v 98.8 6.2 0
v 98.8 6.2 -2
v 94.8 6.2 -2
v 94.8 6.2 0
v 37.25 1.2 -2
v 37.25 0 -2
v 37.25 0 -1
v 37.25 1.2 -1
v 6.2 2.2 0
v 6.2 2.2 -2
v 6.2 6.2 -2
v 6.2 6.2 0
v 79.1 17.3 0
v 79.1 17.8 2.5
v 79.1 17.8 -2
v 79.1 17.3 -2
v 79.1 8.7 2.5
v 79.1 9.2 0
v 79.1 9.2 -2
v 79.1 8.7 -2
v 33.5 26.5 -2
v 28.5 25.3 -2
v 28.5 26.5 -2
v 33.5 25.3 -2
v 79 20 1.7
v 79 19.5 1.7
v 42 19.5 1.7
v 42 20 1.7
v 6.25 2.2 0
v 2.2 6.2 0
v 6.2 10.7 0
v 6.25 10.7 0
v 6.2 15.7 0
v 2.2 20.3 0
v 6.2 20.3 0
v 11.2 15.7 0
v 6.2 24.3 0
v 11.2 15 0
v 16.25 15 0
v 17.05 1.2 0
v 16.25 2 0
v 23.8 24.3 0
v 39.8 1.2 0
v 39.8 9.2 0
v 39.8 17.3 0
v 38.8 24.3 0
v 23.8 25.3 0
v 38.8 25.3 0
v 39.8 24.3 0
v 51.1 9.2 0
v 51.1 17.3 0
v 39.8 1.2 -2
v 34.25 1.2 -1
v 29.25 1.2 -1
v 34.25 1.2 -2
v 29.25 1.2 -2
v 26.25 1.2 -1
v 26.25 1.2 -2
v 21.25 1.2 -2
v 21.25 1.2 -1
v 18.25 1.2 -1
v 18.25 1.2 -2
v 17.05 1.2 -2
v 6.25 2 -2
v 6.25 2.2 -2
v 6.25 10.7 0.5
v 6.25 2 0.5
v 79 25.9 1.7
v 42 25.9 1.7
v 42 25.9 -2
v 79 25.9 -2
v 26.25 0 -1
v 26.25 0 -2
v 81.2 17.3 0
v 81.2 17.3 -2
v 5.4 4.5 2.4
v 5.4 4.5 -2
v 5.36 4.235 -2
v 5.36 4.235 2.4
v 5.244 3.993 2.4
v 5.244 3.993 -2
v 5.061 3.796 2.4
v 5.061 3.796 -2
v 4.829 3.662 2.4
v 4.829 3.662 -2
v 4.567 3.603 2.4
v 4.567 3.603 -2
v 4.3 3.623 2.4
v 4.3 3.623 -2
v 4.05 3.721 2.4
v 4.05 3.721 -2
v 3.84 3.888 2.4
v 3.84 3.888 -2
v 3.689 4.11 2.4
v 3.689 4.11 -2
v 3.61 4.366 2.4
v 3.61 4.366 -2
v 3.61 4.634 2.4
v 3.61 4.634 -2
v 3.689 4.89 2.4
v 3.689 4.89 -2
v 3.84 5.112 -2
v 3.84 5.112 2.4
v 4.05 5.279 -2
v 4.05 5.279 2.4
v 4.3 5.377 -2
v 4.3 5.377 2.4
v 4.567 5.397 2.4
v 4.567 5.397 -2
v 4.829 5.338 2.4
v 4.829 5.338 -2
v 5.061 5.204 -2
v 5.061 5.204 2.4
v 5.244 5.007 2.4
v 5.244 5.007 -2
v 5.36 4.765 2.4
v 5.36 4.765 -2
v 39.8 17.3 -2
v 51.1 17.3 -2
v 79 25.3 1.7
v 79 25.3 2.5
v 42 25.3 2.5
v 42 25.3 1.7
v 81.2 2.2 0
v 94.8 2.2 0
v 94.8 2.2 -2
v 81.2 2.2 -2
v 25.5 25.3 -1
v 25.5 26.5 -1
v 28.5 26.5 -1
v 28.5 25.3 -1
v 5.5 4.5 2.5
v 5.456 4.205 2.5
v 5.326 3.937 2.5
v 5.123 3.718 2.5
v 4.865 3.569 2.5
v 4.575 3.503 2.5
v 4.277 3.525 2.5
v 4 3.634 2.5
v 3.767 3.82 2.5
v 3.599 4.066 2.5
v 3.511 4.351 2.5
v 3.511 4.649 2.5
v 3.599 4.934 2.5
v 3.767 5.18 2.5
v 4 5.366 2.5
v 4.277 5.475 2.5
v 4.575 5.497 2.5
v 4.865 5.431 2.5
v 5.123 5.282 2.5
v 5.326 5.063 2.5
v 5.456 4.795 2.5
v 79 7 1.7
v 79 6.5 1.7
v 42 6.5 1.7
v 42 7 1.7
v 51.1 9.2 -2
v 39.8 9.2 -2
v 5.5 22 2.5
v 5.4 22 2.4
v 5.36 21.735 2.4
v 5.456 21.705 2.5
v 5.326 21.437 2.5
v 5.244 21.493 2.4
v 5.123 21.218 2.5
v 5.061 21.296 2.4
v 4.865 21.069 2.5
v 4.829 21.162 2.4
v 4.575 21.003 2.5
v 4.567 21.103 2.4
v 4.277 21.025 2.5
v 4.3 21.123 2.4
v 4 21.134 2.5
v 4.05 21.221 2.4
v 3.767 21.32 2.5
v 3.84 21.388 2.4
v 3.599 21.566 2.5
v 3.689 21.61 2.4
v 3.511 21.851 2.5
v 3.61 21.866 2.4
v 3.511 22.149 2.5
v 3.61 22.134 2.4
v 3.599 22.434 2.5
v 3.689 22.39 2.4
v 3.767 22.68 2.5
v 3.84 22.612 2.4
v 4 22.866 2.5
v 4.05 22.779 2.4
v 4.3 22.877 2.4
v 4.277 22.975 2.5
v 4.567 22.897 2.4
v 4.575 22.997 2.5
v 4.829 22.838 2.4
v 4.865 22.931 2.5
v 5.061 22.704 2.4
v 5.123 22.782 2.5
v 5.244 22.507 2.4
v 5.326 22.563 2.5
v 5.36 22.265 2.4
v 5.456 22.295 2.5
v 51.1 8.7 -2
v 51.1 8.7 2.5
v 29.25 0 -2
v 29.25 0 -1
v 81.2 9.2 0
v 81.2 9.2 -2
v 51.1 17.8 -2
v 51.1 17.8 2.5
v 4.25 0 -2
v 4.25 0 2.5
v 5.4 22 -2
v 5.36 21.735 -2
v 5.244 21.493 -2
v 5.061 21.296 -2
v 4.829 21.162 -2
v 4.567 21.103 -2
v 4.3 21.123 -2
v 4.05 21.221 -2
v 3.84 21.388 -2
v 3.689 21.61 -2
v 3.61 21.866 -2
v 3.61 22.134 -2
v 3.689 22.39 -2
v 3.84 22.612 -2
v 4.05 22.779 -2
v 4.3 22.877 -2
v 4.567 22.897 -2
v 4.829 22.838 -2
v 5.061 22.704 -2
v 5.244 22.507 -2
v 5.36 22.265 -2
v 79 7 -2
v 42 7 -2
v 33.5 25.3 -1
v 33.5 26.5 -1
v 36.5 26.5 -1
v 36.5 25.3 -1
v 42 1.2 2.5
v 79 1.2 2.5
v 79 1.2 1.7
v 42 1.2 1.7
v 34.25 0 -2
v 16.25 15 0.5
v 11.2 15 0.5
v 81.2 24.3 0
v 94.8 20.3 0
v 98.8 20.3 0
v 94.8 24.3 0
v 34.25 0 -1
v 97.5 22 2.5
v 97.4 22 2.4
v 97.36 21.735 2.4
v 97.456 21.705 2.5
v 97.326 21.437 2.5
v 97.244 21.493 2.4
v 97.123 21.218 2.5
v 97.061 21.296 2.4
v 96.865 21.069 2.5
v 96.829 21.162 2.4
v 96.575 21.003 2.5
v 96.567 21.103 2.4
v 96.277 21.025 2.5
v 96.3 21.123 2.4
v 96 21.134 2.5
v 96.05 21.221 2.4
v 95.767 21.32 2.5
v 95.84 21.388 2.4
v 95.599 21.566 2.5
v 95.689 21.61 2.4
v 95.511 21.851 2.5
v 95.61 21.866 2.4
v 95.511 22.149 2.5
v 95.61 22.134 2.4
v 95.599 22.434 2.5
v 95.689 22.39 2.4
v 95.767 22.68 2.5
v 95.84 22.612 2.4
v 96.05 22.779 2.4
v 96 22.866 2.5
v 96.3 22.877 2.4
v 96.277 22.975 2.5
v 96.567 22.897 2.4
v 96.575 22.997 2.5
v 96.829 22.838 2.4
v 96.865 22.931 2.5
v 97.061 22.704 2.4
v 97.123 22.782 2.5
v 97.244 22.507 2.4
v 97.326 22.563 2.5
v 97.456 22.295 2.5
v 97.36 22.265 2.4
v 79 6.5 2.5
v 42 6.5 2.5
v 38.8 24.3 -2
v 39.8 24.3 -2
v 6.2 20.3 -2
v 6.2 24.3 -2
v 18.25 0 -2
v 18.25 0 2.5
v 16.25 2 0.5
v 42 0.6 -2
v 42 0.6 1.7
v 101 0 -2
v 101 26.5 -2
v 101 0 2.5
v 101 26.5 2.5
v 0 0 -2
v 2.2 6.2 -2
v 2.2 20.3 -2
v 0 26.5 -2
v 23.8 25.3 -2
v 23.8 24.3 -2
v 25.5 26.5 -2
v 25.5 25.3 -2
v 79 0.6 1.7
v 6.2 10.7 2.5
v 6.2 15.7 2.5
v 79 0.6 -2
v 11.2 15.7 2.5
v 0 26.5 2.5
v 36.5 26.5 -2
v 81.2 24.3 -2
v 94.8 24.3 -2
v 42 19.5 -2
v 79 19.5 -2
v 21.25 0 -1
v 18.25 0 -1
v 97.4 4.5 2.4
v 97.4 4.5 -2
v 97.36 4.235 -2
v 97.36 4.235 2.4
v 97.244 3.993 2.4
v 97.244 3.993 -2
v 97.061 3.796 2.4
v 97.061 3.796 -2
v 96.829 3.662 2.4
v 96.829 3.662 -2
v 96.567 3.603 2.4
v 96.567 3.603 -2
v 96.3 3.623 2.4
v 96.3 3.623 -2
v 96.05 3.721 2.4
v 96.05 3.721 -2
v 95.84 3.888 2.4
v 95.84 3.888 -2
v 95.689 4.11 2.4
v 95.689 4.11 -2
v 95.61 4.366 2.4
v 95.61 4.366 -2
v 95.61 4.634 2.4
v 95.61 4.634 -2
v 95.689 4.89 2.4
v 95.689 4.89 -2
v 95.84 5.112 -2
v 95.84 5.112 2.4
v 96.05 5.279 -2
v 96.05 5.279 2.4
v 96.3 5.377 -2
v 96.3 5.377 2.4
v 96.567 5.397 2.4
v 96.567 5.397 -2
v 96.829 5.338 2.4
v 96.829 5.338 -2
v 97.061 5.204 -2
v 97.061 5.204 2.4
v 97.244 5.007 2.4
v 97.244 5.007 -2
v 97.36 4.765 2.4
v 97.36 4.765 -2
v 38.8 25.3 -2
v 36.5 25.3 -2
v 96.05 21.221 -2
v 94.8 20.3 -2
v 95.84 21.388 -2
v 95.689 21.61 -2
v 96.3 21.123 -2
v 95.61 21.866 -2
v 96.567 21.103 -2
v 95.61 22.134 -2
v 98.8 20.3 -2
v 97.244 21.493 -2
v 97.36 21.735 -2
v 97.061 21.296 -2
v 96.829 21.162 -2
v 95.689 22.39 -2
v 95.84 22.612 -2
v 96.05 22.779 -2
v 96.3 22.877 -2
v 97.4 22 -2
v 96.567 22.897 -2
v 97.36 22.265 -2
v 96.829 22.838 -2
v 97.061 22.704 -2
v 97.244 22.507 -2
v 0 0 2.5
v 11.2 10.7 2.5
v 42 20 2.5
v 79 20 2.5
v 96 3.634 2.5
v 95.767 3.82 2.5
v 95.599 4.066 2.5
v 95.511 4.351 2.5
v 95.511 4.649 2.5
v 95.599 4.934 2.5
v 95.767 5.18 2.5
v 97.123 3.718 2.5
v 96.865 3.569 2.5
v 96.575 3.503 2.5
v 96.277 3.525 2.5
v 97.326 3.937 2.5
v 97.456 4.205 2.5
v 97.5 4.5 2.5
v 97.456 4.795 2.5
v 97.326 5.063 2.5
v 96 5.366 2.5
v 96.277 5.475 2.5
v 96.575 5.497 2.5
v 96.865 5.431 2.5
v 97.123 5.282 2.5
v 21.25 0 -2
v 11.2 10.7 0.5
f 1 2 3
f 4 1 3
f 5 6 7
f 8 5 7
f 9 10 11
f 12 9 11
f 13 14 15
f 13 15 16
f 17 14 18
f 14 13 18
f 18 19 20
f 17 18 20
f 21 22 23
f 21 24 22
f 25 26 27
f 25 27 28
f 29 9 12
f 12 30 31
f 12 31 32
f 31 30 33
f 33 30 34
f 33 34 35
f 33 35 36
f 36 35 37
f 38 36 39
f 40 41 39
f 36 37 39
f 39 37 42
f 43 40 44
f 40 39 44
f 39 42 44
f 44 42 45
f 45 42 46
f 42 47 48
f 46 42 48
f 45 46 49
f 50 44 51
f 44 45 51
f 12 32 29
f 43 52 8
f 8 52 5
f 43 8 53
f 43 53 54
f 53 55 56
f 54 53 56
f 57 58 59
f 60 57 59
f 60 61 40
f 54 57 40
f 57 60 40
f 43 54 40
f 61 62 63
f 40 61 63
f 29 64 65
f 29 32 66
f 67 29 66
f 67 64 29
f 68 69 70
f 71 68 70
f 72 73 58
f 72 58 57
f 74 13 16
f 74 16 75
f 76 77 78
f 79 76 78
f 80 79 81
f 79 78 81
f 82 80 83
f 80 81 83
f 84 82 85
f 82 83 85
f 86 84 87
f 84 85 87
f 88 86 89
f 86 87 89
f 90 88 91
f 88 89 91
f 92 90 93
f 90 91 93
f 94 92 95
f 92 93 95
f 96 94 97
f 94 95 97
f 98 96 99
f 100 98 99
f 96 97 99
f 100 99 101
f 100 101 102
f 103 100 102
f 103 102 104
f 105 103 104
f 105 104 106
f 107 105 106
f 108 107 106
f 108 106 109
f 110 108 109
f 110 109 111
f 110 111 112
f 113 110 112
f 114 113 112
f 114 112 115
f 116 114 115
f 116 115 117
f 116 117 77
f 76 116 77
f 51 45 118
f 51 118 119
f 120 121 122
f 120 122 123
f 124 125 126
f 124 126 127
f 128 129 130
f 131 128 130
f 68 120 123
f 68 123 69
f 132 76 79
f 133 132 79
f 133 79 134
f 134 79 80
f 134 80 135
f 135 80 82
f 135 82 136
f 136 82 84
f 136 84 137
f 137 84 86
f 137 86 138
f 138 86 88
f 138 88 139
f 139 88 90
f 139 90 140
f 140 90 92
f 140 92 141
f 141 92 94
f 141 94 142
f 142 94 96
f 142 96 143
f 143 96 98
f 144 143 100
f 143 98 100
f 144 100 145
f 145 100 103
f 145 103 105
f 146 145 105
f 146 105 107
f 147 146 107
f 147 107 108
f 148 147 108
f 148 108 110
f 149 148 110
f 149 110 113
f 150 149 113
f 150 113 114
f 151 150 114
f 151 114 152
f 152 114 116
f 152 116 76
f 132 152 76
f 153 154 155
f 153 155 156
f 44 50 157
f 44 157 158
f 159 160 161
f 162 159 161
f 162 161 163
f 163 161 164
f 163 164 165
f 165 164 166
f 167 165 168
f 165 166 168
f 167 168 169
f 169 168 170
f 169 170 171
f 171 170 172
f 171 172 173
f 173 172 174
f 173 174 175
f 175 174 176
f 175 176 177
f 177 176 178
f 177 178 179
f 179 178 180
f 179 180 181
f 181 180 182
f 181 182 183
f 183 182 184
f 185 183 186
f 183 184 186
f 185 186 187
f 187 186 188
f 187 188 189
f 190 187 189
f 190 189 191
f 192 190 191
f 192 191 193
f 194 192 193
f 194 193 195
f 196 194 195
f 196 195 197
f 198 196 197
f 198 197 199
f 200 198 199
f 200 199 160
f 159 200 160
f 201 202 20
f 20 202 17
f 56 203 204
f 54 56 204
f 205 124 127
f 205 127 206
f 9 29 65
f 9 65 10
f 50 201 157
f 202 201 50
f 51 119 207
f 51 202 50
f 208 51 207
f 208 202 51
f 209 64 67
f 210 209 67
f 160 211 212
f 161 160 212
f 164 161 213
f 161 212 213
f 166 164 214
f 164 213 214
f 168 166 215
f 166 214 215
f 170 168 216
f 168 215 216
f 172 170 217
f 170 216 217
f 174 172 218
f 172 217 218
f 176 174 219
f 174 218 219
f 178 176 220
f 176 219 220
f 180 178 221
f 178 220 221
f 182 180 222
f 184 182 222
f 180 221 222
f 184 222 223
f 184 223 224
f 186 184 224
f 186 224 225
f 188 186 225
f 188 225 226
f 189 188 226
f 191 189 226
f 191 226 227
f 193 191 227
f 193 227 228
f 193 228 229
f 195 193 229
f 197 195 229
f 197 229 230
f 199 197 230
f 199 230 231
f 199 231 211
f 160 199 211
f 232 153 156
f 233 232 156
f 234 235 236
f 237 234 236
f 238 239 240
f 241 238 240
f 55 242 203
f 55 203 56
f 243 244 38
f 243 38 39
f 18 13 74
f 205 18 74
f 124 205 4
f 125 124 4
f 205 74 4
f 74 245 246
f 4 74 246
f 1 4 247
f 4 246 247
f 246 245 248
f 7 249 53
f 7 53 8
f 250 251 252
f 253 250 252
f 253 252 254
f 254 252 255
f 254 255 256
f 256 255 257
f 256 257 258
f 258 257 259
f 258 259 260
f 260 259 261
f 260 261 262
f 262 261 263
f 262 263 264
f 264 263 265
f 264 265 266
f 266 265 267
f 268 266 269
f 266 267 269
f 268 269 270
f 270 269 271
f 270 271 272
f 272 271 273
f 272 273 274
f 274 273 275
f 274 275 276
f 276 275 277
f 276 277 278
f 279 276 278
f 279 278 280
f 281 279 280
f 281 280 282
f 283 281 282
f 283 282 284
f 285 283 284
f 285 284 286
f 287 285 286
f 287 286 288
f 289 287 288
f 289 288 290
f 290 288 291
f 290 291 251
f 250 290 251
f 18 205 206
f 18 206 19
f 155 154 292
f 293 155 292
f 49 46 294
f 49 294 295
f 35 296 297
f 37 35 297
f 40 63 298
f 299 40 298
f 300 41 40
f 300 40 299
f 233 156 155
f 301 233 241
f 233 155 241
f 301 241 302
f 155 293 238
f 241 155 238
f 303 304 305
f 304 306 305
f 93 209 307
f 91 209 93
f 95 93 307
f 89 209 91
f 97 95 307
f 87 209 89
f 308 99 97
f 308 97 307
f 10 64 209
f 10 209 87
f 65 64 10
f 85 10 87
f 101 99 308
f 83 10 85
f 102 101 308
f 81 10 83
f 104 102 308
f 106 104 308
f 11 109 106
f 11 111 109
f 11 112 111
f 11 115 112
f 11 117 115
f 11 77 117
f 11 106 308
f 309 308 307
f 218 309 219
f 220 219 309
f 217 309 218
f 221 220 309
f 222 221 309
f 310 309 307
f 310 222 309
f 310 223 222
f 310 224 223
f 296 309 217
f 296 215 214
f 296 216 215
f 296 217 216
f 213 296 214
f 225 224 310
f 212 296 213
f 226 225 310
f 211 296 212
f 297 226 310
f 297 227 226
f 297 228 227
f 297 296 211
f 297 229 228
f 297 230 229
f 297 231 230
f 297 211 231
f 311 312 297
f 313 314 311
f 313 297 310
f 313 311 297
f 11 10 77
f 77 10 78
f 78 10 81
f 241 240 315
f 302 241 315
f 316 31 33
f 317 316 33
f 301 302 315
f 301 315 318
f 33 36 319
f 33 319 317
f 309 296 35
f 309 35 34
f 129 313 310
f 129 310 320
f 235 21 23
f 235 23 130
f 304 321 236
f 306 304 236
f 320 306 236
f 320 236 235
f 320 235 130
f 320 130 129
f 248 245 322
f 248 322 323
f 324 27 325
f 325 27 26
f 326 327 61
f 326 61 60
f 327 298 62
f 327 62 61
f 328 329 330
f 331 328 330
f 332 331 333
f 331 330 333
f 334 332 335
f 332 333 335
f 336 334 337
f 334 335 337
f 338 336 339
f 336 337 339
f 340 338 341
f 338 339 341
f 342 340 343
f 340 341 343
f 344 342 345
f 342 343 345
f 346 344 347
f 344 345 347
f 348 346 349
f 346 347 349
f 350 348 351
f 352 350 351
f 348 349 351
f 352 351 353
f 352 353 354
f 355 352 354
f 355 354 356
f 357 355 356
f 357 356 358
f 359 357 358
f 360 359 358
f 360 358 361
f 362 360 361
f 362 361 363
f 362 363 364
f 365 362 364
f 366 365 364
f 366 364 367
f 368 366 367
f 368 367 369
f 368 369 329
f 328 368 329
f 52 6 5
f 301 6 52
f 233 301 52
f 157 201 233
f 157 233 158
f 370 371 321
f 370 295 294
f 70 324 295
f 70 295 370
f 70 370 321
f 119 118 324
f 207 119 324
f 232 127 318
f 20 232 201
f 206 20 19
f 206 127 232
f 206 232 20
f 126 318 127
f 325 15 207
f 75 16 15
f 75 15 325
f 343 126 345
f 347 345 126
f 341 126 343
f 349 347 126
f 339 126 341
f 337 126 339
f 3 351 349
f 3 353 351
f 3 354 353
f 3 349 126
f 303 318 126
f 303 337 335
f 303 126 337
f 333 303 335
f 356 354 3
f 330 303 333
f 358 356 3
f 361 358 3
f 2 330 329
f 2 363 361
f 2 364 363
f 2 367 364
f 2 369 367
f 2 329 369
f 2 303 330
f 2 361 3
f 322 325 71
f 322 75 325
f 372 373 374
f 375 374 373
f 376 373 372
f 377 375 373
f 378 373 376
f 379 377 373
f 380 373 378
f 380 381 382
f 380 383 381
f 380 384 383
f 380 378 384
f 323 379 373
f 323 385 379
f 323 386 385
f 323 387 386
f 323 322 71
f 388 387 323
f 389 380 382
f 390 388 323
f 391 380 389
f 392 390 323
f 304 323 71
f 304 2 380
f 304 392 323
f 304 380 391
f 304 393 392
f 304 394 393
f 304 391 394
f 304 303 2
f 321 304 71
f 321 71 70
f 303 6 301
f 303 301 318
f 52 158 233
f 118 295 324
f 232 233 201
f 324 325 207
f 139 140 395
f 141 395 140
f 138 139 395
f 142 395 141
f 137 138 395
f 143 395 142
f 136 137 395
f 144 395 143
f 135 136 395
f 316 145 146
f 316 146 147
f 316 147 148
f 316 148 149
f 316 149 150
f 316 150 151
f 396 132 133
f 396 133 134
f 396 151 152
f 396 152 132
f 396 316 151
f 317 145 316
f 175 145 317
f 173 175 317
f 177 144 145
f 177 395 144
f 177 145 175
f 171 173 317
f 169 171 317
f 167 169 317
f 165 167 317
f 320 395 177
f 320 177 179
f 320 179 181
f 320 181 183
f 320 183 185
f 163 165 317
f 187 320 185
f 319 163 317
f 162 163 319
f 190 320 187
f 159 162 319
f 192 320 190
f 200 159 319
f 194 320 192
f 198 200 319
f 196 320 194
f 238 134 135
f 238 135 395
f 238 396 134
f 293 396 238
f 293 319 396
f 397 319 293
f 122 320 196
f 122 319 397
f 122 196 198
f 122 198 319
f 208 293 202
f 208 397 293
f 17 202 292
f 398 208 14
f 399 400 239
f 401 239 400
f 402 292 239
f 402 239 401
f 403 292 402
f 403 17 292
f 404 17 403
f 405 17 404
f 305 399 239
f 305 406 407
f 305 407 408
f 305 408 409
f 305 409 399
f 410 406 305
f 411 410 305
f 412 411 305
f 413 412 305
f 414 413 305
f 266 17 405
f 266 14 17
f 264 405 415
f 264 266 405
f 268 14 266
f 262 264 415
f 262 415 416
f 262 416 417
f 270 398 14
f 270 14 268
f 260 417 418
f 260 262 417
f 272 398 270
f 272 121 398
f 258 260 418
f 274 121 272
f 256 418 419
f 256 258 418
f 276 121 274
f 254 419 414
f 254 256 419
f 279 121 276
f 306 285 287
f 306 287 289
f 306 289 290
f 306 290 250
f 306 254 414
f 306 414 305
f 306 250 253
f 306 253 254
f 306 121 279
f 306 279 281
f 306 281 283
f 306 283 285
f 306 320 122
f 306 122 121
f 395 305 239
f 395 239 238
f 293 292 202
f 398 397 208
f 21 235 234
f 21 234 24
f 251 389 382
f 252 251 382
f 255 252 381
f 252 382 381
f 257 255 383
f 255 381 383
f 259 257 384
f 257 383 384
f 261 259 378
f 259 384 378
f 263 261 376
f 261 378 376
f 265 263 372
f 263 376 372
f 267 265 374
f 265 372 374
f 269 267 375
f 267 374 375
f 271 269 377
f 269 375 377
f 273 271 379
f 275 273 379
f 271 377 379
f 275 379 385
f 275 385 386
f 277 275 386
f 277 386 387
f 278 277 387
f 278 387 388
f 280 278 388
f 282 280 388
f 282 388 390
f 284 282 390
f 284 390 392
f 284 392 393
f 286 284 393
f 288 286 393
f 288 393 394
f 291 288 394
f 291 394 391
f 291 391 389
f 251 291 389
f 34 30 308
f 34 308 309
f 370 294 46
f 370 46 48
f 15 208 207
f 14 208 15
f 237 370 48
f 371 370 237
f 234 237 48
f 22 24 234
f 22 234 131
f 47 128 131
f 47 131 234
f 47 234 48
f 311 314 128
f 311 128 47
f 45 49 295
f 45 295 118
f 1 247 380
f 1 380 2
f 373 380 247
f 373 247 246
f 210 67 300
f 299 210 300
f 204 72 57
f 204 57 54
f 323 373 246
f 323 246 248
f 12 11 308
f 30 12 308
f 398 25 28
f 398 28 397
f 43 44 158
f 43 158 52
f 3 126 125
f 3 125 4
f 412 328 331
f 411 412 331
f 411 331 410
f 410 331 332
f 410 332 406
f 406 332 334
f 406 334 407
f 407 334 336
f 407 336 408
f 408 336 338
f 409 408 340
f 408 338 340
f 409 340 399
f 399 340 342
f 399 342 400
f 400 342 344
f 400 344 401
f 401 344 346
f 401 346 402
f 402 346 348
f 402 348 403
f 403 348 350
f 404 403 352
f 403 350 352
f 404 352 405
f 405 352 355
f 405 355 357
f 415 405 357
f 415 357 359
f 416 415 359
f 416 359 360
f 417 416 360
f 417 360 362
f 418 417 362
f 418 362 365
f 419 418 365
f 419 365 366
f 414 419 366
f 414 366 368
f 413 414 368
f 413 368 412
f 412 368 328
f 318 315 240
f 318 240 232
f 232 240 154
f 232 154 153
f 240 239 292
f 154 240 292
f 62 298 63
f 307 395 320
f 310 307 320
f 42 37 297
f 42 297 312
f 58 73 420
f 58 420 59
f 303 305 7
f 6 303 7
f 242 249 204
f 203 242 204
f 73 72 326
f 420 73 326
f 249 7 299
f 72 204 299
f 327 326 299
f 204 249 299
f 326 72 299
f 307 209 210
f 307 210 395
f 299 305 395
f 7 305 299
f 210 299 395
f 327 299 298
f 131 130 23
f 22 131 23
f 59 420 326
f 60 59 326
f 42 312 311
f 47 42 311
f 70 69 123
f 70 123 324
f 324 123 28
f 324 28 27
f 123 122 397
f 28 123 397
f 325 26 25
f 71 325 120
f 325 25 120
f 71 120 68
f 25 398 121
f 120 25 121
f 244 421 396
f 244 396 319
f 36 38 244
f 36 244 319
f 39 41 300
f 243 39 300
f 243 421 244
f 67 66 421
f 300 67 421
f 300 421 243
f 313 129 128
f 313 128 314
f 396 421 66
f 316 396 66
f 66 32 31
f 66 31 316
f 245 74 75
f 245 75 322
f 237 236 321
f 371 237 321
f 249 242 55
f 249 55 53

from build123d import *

# Parameters (mm, degrees)
SKETCH_1_W                   = 101
SKETCH_1_H                   = 26.5
EXTRUDE_1_DEPTH              = 2.5
SKETCH_10_W                  = 37
SKETCH_10_H                  = 7
CUT_EXTRUDE_1_DEPTH          = 2.5
EXTRUDE_2_DEPTH              = 2
HOLE_WIZARD_M6_4_D           = 1.8
HOLE_WIZARD_M6_4_CSINK_D     = 2
HOLE_WIZARD_M6_4_CSINK_ANGLE = 90
EXTRUDE_START                = 2
SKETCH_17_W                  = 4
SKETCH_17_H                  = 4
SKETCH_17_R                  = 0.9
EXTRUDE_3_DEPTH              = 2
SKETCH_18_W                  = 42.1
SKETCH_18_H                  = 9.1
CUT_EXTRUDE_2_DEPTH          = 1
CUT_EXTRUDE_3_REACH          = 106.477
SKETCH_20_W                  = 28
SKETCH_20_H                  = 9.1
SKETCH_22_W                  = 0.8
SKETCH_22_H                  = 0.5
EXTRUDE_4_DEPTH              = 37
EXTRUDE_5_DEPTH              = 1
SKETCH_24_W                  = 10
SKETCH_24_H                  = 2.5
SKETCH_24_W_2                = 3
SKETCH_24_H_2                = 1
CUT_EXTRUDE_4_DEPTH          = 15
CHAMFER_1_SIZE               = 2
CUT_EXTRUDE_5_REACH          = 106.449
SKETCH_25_W                  = 3
SKETCH_25_H                  = 1
SKETCH_27_W                  = 5
SKETCH_27_H                  = 5
CUT_EXTRUDE_6_DEPTH          = 9
SKETCH_28_W                  = 15
SKETCH_28_H                  = 1
SKETCH_28_W_2                = 23.55
CUT_EXTRUDE_7_DEPTH          = 2


with BuildPart() as part:
    # 草图1 → 凸台-拉伸1 (new body)
    with BuildSketch(Plane.XY):
        with Locations((50.5, 13.25)):
            Rectangle(SKETCH_1_W, SKETCH_1_H)
    extrude(amount=EXTRUDE_1_DEPTH)

    # 草图10 → 切除-拉伸1 (cut)
    with BuildSketch(Plane.XY.offset(2.5)):
        with Locations((60.5, 23)):
            Rectangle(SKETCH_10_W, SKETCH_10_H)
        with Locations((60.5, 3.5)):
            Rectangle(SKETCH_10_W, SKETCH_10_H)
    extrude(amount=-CUT_EXTRUDE_1_DEPTH, mode=Mode.SUBTRACT)

    # 草图11 → 凸台-拉伸2 (add)
    with BuildSketch(Plane(origin=(0, 0, 0), x_dir=(-1, 0, 0), z_dir=(0, 0, -1))):
        Polygon((-42, 26.5), (-42, 19.5), (-79, 19.5), (-79, 26.5), (-101, 26.5), (-101, 0), (-79, 0), (-79, 7), (-42, 7), (-42, 0), (0, 0), (0, 26.5), align=None)
        Polygon((-39.8, 24.3), (-39.8, 17.3), (-81.2, 17.3), (-81.2, 24.3), (-98.8, 24.3), (-98.8, 2.2), (-81.2, 2.2), (-81.2, 9.2), (-39.8, 9.2), (-39.8, 2.2), (-2.2, 2.2), (-2.2, 24.3), align=None, mode=Mode.SUBTRACT)
    extrude(amount=EXTRUDE_2_DEPTH)

    # M6 开槽半沉头螺钉的锥形沉头孔4 (through all)
    with Locations(Plane(origin=(0, 0, 2.5), x_dir=(-1, 0, 0), z_dir=(0, 0, 1))):
        with Locations((-4.5, -4.5), (-96.5, -22), (-96.5, -4.5), (-4.5, -22)):
            CounterSinkHole(HOLE_WIZARD_M6_4_D / 2, HOLE_WIZARD_M6_4_CSINK_D / 2, counter_sink_angle=HOLE_WIZARD_M6_4_CSINK_ANGLE)

    # 草图17 → 凸台-拉伸3 (add)
    # profile 1 of 4: a face of its own
    with BuildSketch(Plane(origin=(0, 0, 0), x_dir=(-1, 0, 0), z_dir=(0, 0, -1)).offset(EXTRUDE_START)):
        with Locations((-96.8, 22.3)):
            Rectangle(SKETCH_17_W, SKETCH_17_H)
        with Locations(Location((-96.5, 22, 0), (0, 0, 180))):
            Circle(SKETCH_17_R, mode=Mode.SUBTRACT)
    # profile 2 of 4: a face of its own
    with BuildSketch(Plane(origin=(0, 0, 0), x_dir=(-1, 0, 0), z_dir=(0, 0, -1)).offset(EXTRUDE_START)):
        with Locations((-96.8, 4.2)):
            Rectangle(SKETCH_17_W, SKETCH_17_H)
        with Locations(Location((-96.5, 4.5, 0), (0, 0, 180))):
            Circle(SKETCH_17_R, mode=Mode.SUBTRACT)
    # profile 3 of 4: a face of its own
    with BuildSketch(Plane(origin=(0, 0, 0), x_dir=(-1, 0, 0), z_dir=(0, 0, -1)).offset(EXTRUDE_START)):
        with Locations((-4.2, 22.3)):
            Rectangle(SKETCH_17_W, SKETCH_17_H)
        with Locations(Location((-4.5, 22, 0), (0, 0, 180))):
            Circle(SKETCH_17_R, mode=Mode.SUBTRACT)
    # profile 4 of 4: a face of its own
    with BuildSketch(Plane(origin=(0, 0, 0), x_dir=(-1, 0, 0), z_dir=(0, 0, -1)).offset(EXTRUDE_START)):
        with Locations((-4.2, 4.2)):
            Rectangle(SKETCH_17_W, SKETCH_17_H)
        with Locations(Location((-4.5, 4.5, 0), (0, 0, 180))):
            Circle(SKETCH_17_R, mode=Mode.SUBTRACT)
    extrude(amount=-EXTRUDE_3_DEPTH)

    # 草图18 → 切除-拉伸2 (cut)
    with BuildSketch(Plane.XY.offset(2.5)):
        Polygon((37, 8.7), (37, 17.8), (37, 19.5), (32, 19.5), (32, 7), (37, 7), align=None)
        with Locations((58.05, 13.25)):
            Rectangle(SKETCH_18_W, SKETCH_18_H)
        Polygon((79.1, 19.5), (79.1, 17.8), (79.1, 8.7), (79.1, 7), (84.1, 7), (84.1, 19.5), align=None)
    extrude(amount=-CUT_EXTRUDE_2_DEPTH, mode=Mode.SUBTRACT)

    # 草图20 → 切除-拉伸3 (cut, up to next)
    with BuildSketch(Plane.XY.offset(1.5), mode=Mode.PRIVATE) as cut_extrude_3_sk1:
        with Locations((65.1, 13.25)):
            Rectangle(SKETCH_20_W, SKETCH_20_H)
    cut_extrude_3_tool1 = extrude(cut_extrude_3_sk1.sketch, amount=-CUT_EXTRUDE_3_REACH, mode=Mode.PRIVATE) & part.part
    add(cut_extrude_3_tool1.solids().sort_by_distance((65.1, 13.25, 1.5))[0], mode=Mode.SUBTRACT)

    # 草图22 → 凸台-拉伸4 (add)
    with BuildSketch(Plane.ZY.offset(-79)):
        Polygon((-2, 26.5), (2.5, 26.5), (2.5, 25.35398434), (2.5, 25.3), (1.7, 25.3), (1.7, 25.9), (-2, 25.9), align=None)
        with Locations((2.1, 19.75)):
            Rectangle(SKETCH_22_W, SKETCH_22_H)
        with Locations((2.1, 6.75)):
            Rectangle(SKETCH_22_W, SKETCH_22_H)
        Polygon((-2, 0.6), (-2, 0), (2.5, 0), (2.5, 1.14601566), (2.5, 1.2), (1.7, 1.2), (1.7, 0.6), align=None)
    extrude(amount=EXTRUDE_4_DEPTH)

    # 草图23 → 凸台-拉伸5 (add)
    with BuildSketch(Plane.XY.offset(1.5)):
        Polygon((84.1, 7), (84.1, 19.5), (79.1, 19.5), (79.1, 17.8), (79.1, 8.7), (79.1, 7), align=None)
        Polygon((51.1, 8.7), (51.1, 17.8), (37, 17.8), (37, 19.5), (32, 19.5), (32, 7), (37, 7), (37, 8.7), align=None)
    extrude(amount=EXTRUDE_5_DEPTH)

    # 草图24 → 切除-拉伸4 (cut)
    with BuildSketch(Plane.XZ):
        with Locations((11.25, -0.75)):
            Rectangle(SKETCH_24_W, SKETCH_24_H)
        with Locations((19.75, -1.5)):
            Rectangle(SKETCH_24_W_2, SKETCH_24_H_2)
        with Locations((27.75, -1.5)):
            Rectangle(SKETCH_24_W_2, SKETCH_24_H_2)
        with Locations((35.75, -1.5)):
            Rectangle(SKETCH_24_W_2, SKETCH_24_H_2)
    extrude(amount=-CUT_EXTRUDE_4_DEPTH, mode=Mode.SUBTRACT)

    # 倒角1
    chamfer_1_edges = [part.edges().sort_by_distance(p)[0] for p in [
        (6.25, 0, -0.75),
        (16.25, 0, -0.75),
        (11.25, 0, 0.5),
    ]]
    chamfer(chamfer_1_edges, length=CHAMFER_1_SIZE - 0.0001)  # a hair under: the kernel refuses the full size

    # 草图25 → 切除-拉伸5 (cut, up to next)
    with BuildSketch(Plane(origin=(0, 26.5, 0), x_dir=(1, 0, 0), z_dir=(0, 1, 0)), mode=Mode.PRIVATE) as cut_extrude_5_sk1:
        with Locations((27, 1.5)):
            Rectangle(SKETCH_25_W, SKETCH_25_H)
    cut_extrude_5_tool1 = extrude(cut_extrude_5_sk1.sketch, amount=-CUT_EXTRUDE_5_REACH, mode=Mode.PRIVATE) & part.part
    # 草图25 → 切除-拉伸5 (cut, up to next)
    with BuildSketch(Plane(origin=(0, 26.5, 0), x_dir=(1, 0, 0), z_dir=(0, 1, 0)), mode=Mode.PRIVATE) as cut_extrude_5_sk2:
        with Locations((35, 1.5)):
            Rectangle(SKETCH_25_W, SKETCH_25_H)
    cut_extrude_5_tool2 = extrude(cut_extrude_5_sk2.sketch, amount=-CUT_EXTRUDE_5_REACH, mode=Mode.PRIVATE) & part.part
    add(cut_extrude_5_tool1.solids().sort_by_distance((27, 26.5, -1.5))[0], mode=Mode.SUBTRACT)
    add(cut_extrude_5_tool2.solids().sort_by_distance((35, 26.5, -1.5))[0], mode=Mode.SUBTRACT)

    # 草图27 → 切除-拉伸6 (cut)
    with BuildSketch(Plane(origin=(0, 0, 0), x_dir=(-1, 0, 0), z_dir=(0, 0, -1))):
        with Locations((-8.7, 13.2)):
            Rectangle(SKETCH_27_W, SKETCH_27_H)
    extrude(amount=-CUT_EXTRUDE_6_DEPTH, mode=Mode.SUBTRACT)

    # 草图28 → 切除-拉伸7 (cut)
    with BuildSketch(Plane(origin=(0, 0, -2), x_dir=(-1, 0, 0), z_dir=(0, 0, -1))):
        with Locations((-31.3, 24.8)):
            Rectangle(SKETCH_28_W, SKETCH_28_H)
        with Locations((-28.025, 1.7)):
            Rectangle(SKETCH_28_W_2, SKETCH_28_H)
    extrude(amount=-CUT_EXTRUDE_7_DEPTH, mode=Mode.SUBTRACT)


solid = part.part
